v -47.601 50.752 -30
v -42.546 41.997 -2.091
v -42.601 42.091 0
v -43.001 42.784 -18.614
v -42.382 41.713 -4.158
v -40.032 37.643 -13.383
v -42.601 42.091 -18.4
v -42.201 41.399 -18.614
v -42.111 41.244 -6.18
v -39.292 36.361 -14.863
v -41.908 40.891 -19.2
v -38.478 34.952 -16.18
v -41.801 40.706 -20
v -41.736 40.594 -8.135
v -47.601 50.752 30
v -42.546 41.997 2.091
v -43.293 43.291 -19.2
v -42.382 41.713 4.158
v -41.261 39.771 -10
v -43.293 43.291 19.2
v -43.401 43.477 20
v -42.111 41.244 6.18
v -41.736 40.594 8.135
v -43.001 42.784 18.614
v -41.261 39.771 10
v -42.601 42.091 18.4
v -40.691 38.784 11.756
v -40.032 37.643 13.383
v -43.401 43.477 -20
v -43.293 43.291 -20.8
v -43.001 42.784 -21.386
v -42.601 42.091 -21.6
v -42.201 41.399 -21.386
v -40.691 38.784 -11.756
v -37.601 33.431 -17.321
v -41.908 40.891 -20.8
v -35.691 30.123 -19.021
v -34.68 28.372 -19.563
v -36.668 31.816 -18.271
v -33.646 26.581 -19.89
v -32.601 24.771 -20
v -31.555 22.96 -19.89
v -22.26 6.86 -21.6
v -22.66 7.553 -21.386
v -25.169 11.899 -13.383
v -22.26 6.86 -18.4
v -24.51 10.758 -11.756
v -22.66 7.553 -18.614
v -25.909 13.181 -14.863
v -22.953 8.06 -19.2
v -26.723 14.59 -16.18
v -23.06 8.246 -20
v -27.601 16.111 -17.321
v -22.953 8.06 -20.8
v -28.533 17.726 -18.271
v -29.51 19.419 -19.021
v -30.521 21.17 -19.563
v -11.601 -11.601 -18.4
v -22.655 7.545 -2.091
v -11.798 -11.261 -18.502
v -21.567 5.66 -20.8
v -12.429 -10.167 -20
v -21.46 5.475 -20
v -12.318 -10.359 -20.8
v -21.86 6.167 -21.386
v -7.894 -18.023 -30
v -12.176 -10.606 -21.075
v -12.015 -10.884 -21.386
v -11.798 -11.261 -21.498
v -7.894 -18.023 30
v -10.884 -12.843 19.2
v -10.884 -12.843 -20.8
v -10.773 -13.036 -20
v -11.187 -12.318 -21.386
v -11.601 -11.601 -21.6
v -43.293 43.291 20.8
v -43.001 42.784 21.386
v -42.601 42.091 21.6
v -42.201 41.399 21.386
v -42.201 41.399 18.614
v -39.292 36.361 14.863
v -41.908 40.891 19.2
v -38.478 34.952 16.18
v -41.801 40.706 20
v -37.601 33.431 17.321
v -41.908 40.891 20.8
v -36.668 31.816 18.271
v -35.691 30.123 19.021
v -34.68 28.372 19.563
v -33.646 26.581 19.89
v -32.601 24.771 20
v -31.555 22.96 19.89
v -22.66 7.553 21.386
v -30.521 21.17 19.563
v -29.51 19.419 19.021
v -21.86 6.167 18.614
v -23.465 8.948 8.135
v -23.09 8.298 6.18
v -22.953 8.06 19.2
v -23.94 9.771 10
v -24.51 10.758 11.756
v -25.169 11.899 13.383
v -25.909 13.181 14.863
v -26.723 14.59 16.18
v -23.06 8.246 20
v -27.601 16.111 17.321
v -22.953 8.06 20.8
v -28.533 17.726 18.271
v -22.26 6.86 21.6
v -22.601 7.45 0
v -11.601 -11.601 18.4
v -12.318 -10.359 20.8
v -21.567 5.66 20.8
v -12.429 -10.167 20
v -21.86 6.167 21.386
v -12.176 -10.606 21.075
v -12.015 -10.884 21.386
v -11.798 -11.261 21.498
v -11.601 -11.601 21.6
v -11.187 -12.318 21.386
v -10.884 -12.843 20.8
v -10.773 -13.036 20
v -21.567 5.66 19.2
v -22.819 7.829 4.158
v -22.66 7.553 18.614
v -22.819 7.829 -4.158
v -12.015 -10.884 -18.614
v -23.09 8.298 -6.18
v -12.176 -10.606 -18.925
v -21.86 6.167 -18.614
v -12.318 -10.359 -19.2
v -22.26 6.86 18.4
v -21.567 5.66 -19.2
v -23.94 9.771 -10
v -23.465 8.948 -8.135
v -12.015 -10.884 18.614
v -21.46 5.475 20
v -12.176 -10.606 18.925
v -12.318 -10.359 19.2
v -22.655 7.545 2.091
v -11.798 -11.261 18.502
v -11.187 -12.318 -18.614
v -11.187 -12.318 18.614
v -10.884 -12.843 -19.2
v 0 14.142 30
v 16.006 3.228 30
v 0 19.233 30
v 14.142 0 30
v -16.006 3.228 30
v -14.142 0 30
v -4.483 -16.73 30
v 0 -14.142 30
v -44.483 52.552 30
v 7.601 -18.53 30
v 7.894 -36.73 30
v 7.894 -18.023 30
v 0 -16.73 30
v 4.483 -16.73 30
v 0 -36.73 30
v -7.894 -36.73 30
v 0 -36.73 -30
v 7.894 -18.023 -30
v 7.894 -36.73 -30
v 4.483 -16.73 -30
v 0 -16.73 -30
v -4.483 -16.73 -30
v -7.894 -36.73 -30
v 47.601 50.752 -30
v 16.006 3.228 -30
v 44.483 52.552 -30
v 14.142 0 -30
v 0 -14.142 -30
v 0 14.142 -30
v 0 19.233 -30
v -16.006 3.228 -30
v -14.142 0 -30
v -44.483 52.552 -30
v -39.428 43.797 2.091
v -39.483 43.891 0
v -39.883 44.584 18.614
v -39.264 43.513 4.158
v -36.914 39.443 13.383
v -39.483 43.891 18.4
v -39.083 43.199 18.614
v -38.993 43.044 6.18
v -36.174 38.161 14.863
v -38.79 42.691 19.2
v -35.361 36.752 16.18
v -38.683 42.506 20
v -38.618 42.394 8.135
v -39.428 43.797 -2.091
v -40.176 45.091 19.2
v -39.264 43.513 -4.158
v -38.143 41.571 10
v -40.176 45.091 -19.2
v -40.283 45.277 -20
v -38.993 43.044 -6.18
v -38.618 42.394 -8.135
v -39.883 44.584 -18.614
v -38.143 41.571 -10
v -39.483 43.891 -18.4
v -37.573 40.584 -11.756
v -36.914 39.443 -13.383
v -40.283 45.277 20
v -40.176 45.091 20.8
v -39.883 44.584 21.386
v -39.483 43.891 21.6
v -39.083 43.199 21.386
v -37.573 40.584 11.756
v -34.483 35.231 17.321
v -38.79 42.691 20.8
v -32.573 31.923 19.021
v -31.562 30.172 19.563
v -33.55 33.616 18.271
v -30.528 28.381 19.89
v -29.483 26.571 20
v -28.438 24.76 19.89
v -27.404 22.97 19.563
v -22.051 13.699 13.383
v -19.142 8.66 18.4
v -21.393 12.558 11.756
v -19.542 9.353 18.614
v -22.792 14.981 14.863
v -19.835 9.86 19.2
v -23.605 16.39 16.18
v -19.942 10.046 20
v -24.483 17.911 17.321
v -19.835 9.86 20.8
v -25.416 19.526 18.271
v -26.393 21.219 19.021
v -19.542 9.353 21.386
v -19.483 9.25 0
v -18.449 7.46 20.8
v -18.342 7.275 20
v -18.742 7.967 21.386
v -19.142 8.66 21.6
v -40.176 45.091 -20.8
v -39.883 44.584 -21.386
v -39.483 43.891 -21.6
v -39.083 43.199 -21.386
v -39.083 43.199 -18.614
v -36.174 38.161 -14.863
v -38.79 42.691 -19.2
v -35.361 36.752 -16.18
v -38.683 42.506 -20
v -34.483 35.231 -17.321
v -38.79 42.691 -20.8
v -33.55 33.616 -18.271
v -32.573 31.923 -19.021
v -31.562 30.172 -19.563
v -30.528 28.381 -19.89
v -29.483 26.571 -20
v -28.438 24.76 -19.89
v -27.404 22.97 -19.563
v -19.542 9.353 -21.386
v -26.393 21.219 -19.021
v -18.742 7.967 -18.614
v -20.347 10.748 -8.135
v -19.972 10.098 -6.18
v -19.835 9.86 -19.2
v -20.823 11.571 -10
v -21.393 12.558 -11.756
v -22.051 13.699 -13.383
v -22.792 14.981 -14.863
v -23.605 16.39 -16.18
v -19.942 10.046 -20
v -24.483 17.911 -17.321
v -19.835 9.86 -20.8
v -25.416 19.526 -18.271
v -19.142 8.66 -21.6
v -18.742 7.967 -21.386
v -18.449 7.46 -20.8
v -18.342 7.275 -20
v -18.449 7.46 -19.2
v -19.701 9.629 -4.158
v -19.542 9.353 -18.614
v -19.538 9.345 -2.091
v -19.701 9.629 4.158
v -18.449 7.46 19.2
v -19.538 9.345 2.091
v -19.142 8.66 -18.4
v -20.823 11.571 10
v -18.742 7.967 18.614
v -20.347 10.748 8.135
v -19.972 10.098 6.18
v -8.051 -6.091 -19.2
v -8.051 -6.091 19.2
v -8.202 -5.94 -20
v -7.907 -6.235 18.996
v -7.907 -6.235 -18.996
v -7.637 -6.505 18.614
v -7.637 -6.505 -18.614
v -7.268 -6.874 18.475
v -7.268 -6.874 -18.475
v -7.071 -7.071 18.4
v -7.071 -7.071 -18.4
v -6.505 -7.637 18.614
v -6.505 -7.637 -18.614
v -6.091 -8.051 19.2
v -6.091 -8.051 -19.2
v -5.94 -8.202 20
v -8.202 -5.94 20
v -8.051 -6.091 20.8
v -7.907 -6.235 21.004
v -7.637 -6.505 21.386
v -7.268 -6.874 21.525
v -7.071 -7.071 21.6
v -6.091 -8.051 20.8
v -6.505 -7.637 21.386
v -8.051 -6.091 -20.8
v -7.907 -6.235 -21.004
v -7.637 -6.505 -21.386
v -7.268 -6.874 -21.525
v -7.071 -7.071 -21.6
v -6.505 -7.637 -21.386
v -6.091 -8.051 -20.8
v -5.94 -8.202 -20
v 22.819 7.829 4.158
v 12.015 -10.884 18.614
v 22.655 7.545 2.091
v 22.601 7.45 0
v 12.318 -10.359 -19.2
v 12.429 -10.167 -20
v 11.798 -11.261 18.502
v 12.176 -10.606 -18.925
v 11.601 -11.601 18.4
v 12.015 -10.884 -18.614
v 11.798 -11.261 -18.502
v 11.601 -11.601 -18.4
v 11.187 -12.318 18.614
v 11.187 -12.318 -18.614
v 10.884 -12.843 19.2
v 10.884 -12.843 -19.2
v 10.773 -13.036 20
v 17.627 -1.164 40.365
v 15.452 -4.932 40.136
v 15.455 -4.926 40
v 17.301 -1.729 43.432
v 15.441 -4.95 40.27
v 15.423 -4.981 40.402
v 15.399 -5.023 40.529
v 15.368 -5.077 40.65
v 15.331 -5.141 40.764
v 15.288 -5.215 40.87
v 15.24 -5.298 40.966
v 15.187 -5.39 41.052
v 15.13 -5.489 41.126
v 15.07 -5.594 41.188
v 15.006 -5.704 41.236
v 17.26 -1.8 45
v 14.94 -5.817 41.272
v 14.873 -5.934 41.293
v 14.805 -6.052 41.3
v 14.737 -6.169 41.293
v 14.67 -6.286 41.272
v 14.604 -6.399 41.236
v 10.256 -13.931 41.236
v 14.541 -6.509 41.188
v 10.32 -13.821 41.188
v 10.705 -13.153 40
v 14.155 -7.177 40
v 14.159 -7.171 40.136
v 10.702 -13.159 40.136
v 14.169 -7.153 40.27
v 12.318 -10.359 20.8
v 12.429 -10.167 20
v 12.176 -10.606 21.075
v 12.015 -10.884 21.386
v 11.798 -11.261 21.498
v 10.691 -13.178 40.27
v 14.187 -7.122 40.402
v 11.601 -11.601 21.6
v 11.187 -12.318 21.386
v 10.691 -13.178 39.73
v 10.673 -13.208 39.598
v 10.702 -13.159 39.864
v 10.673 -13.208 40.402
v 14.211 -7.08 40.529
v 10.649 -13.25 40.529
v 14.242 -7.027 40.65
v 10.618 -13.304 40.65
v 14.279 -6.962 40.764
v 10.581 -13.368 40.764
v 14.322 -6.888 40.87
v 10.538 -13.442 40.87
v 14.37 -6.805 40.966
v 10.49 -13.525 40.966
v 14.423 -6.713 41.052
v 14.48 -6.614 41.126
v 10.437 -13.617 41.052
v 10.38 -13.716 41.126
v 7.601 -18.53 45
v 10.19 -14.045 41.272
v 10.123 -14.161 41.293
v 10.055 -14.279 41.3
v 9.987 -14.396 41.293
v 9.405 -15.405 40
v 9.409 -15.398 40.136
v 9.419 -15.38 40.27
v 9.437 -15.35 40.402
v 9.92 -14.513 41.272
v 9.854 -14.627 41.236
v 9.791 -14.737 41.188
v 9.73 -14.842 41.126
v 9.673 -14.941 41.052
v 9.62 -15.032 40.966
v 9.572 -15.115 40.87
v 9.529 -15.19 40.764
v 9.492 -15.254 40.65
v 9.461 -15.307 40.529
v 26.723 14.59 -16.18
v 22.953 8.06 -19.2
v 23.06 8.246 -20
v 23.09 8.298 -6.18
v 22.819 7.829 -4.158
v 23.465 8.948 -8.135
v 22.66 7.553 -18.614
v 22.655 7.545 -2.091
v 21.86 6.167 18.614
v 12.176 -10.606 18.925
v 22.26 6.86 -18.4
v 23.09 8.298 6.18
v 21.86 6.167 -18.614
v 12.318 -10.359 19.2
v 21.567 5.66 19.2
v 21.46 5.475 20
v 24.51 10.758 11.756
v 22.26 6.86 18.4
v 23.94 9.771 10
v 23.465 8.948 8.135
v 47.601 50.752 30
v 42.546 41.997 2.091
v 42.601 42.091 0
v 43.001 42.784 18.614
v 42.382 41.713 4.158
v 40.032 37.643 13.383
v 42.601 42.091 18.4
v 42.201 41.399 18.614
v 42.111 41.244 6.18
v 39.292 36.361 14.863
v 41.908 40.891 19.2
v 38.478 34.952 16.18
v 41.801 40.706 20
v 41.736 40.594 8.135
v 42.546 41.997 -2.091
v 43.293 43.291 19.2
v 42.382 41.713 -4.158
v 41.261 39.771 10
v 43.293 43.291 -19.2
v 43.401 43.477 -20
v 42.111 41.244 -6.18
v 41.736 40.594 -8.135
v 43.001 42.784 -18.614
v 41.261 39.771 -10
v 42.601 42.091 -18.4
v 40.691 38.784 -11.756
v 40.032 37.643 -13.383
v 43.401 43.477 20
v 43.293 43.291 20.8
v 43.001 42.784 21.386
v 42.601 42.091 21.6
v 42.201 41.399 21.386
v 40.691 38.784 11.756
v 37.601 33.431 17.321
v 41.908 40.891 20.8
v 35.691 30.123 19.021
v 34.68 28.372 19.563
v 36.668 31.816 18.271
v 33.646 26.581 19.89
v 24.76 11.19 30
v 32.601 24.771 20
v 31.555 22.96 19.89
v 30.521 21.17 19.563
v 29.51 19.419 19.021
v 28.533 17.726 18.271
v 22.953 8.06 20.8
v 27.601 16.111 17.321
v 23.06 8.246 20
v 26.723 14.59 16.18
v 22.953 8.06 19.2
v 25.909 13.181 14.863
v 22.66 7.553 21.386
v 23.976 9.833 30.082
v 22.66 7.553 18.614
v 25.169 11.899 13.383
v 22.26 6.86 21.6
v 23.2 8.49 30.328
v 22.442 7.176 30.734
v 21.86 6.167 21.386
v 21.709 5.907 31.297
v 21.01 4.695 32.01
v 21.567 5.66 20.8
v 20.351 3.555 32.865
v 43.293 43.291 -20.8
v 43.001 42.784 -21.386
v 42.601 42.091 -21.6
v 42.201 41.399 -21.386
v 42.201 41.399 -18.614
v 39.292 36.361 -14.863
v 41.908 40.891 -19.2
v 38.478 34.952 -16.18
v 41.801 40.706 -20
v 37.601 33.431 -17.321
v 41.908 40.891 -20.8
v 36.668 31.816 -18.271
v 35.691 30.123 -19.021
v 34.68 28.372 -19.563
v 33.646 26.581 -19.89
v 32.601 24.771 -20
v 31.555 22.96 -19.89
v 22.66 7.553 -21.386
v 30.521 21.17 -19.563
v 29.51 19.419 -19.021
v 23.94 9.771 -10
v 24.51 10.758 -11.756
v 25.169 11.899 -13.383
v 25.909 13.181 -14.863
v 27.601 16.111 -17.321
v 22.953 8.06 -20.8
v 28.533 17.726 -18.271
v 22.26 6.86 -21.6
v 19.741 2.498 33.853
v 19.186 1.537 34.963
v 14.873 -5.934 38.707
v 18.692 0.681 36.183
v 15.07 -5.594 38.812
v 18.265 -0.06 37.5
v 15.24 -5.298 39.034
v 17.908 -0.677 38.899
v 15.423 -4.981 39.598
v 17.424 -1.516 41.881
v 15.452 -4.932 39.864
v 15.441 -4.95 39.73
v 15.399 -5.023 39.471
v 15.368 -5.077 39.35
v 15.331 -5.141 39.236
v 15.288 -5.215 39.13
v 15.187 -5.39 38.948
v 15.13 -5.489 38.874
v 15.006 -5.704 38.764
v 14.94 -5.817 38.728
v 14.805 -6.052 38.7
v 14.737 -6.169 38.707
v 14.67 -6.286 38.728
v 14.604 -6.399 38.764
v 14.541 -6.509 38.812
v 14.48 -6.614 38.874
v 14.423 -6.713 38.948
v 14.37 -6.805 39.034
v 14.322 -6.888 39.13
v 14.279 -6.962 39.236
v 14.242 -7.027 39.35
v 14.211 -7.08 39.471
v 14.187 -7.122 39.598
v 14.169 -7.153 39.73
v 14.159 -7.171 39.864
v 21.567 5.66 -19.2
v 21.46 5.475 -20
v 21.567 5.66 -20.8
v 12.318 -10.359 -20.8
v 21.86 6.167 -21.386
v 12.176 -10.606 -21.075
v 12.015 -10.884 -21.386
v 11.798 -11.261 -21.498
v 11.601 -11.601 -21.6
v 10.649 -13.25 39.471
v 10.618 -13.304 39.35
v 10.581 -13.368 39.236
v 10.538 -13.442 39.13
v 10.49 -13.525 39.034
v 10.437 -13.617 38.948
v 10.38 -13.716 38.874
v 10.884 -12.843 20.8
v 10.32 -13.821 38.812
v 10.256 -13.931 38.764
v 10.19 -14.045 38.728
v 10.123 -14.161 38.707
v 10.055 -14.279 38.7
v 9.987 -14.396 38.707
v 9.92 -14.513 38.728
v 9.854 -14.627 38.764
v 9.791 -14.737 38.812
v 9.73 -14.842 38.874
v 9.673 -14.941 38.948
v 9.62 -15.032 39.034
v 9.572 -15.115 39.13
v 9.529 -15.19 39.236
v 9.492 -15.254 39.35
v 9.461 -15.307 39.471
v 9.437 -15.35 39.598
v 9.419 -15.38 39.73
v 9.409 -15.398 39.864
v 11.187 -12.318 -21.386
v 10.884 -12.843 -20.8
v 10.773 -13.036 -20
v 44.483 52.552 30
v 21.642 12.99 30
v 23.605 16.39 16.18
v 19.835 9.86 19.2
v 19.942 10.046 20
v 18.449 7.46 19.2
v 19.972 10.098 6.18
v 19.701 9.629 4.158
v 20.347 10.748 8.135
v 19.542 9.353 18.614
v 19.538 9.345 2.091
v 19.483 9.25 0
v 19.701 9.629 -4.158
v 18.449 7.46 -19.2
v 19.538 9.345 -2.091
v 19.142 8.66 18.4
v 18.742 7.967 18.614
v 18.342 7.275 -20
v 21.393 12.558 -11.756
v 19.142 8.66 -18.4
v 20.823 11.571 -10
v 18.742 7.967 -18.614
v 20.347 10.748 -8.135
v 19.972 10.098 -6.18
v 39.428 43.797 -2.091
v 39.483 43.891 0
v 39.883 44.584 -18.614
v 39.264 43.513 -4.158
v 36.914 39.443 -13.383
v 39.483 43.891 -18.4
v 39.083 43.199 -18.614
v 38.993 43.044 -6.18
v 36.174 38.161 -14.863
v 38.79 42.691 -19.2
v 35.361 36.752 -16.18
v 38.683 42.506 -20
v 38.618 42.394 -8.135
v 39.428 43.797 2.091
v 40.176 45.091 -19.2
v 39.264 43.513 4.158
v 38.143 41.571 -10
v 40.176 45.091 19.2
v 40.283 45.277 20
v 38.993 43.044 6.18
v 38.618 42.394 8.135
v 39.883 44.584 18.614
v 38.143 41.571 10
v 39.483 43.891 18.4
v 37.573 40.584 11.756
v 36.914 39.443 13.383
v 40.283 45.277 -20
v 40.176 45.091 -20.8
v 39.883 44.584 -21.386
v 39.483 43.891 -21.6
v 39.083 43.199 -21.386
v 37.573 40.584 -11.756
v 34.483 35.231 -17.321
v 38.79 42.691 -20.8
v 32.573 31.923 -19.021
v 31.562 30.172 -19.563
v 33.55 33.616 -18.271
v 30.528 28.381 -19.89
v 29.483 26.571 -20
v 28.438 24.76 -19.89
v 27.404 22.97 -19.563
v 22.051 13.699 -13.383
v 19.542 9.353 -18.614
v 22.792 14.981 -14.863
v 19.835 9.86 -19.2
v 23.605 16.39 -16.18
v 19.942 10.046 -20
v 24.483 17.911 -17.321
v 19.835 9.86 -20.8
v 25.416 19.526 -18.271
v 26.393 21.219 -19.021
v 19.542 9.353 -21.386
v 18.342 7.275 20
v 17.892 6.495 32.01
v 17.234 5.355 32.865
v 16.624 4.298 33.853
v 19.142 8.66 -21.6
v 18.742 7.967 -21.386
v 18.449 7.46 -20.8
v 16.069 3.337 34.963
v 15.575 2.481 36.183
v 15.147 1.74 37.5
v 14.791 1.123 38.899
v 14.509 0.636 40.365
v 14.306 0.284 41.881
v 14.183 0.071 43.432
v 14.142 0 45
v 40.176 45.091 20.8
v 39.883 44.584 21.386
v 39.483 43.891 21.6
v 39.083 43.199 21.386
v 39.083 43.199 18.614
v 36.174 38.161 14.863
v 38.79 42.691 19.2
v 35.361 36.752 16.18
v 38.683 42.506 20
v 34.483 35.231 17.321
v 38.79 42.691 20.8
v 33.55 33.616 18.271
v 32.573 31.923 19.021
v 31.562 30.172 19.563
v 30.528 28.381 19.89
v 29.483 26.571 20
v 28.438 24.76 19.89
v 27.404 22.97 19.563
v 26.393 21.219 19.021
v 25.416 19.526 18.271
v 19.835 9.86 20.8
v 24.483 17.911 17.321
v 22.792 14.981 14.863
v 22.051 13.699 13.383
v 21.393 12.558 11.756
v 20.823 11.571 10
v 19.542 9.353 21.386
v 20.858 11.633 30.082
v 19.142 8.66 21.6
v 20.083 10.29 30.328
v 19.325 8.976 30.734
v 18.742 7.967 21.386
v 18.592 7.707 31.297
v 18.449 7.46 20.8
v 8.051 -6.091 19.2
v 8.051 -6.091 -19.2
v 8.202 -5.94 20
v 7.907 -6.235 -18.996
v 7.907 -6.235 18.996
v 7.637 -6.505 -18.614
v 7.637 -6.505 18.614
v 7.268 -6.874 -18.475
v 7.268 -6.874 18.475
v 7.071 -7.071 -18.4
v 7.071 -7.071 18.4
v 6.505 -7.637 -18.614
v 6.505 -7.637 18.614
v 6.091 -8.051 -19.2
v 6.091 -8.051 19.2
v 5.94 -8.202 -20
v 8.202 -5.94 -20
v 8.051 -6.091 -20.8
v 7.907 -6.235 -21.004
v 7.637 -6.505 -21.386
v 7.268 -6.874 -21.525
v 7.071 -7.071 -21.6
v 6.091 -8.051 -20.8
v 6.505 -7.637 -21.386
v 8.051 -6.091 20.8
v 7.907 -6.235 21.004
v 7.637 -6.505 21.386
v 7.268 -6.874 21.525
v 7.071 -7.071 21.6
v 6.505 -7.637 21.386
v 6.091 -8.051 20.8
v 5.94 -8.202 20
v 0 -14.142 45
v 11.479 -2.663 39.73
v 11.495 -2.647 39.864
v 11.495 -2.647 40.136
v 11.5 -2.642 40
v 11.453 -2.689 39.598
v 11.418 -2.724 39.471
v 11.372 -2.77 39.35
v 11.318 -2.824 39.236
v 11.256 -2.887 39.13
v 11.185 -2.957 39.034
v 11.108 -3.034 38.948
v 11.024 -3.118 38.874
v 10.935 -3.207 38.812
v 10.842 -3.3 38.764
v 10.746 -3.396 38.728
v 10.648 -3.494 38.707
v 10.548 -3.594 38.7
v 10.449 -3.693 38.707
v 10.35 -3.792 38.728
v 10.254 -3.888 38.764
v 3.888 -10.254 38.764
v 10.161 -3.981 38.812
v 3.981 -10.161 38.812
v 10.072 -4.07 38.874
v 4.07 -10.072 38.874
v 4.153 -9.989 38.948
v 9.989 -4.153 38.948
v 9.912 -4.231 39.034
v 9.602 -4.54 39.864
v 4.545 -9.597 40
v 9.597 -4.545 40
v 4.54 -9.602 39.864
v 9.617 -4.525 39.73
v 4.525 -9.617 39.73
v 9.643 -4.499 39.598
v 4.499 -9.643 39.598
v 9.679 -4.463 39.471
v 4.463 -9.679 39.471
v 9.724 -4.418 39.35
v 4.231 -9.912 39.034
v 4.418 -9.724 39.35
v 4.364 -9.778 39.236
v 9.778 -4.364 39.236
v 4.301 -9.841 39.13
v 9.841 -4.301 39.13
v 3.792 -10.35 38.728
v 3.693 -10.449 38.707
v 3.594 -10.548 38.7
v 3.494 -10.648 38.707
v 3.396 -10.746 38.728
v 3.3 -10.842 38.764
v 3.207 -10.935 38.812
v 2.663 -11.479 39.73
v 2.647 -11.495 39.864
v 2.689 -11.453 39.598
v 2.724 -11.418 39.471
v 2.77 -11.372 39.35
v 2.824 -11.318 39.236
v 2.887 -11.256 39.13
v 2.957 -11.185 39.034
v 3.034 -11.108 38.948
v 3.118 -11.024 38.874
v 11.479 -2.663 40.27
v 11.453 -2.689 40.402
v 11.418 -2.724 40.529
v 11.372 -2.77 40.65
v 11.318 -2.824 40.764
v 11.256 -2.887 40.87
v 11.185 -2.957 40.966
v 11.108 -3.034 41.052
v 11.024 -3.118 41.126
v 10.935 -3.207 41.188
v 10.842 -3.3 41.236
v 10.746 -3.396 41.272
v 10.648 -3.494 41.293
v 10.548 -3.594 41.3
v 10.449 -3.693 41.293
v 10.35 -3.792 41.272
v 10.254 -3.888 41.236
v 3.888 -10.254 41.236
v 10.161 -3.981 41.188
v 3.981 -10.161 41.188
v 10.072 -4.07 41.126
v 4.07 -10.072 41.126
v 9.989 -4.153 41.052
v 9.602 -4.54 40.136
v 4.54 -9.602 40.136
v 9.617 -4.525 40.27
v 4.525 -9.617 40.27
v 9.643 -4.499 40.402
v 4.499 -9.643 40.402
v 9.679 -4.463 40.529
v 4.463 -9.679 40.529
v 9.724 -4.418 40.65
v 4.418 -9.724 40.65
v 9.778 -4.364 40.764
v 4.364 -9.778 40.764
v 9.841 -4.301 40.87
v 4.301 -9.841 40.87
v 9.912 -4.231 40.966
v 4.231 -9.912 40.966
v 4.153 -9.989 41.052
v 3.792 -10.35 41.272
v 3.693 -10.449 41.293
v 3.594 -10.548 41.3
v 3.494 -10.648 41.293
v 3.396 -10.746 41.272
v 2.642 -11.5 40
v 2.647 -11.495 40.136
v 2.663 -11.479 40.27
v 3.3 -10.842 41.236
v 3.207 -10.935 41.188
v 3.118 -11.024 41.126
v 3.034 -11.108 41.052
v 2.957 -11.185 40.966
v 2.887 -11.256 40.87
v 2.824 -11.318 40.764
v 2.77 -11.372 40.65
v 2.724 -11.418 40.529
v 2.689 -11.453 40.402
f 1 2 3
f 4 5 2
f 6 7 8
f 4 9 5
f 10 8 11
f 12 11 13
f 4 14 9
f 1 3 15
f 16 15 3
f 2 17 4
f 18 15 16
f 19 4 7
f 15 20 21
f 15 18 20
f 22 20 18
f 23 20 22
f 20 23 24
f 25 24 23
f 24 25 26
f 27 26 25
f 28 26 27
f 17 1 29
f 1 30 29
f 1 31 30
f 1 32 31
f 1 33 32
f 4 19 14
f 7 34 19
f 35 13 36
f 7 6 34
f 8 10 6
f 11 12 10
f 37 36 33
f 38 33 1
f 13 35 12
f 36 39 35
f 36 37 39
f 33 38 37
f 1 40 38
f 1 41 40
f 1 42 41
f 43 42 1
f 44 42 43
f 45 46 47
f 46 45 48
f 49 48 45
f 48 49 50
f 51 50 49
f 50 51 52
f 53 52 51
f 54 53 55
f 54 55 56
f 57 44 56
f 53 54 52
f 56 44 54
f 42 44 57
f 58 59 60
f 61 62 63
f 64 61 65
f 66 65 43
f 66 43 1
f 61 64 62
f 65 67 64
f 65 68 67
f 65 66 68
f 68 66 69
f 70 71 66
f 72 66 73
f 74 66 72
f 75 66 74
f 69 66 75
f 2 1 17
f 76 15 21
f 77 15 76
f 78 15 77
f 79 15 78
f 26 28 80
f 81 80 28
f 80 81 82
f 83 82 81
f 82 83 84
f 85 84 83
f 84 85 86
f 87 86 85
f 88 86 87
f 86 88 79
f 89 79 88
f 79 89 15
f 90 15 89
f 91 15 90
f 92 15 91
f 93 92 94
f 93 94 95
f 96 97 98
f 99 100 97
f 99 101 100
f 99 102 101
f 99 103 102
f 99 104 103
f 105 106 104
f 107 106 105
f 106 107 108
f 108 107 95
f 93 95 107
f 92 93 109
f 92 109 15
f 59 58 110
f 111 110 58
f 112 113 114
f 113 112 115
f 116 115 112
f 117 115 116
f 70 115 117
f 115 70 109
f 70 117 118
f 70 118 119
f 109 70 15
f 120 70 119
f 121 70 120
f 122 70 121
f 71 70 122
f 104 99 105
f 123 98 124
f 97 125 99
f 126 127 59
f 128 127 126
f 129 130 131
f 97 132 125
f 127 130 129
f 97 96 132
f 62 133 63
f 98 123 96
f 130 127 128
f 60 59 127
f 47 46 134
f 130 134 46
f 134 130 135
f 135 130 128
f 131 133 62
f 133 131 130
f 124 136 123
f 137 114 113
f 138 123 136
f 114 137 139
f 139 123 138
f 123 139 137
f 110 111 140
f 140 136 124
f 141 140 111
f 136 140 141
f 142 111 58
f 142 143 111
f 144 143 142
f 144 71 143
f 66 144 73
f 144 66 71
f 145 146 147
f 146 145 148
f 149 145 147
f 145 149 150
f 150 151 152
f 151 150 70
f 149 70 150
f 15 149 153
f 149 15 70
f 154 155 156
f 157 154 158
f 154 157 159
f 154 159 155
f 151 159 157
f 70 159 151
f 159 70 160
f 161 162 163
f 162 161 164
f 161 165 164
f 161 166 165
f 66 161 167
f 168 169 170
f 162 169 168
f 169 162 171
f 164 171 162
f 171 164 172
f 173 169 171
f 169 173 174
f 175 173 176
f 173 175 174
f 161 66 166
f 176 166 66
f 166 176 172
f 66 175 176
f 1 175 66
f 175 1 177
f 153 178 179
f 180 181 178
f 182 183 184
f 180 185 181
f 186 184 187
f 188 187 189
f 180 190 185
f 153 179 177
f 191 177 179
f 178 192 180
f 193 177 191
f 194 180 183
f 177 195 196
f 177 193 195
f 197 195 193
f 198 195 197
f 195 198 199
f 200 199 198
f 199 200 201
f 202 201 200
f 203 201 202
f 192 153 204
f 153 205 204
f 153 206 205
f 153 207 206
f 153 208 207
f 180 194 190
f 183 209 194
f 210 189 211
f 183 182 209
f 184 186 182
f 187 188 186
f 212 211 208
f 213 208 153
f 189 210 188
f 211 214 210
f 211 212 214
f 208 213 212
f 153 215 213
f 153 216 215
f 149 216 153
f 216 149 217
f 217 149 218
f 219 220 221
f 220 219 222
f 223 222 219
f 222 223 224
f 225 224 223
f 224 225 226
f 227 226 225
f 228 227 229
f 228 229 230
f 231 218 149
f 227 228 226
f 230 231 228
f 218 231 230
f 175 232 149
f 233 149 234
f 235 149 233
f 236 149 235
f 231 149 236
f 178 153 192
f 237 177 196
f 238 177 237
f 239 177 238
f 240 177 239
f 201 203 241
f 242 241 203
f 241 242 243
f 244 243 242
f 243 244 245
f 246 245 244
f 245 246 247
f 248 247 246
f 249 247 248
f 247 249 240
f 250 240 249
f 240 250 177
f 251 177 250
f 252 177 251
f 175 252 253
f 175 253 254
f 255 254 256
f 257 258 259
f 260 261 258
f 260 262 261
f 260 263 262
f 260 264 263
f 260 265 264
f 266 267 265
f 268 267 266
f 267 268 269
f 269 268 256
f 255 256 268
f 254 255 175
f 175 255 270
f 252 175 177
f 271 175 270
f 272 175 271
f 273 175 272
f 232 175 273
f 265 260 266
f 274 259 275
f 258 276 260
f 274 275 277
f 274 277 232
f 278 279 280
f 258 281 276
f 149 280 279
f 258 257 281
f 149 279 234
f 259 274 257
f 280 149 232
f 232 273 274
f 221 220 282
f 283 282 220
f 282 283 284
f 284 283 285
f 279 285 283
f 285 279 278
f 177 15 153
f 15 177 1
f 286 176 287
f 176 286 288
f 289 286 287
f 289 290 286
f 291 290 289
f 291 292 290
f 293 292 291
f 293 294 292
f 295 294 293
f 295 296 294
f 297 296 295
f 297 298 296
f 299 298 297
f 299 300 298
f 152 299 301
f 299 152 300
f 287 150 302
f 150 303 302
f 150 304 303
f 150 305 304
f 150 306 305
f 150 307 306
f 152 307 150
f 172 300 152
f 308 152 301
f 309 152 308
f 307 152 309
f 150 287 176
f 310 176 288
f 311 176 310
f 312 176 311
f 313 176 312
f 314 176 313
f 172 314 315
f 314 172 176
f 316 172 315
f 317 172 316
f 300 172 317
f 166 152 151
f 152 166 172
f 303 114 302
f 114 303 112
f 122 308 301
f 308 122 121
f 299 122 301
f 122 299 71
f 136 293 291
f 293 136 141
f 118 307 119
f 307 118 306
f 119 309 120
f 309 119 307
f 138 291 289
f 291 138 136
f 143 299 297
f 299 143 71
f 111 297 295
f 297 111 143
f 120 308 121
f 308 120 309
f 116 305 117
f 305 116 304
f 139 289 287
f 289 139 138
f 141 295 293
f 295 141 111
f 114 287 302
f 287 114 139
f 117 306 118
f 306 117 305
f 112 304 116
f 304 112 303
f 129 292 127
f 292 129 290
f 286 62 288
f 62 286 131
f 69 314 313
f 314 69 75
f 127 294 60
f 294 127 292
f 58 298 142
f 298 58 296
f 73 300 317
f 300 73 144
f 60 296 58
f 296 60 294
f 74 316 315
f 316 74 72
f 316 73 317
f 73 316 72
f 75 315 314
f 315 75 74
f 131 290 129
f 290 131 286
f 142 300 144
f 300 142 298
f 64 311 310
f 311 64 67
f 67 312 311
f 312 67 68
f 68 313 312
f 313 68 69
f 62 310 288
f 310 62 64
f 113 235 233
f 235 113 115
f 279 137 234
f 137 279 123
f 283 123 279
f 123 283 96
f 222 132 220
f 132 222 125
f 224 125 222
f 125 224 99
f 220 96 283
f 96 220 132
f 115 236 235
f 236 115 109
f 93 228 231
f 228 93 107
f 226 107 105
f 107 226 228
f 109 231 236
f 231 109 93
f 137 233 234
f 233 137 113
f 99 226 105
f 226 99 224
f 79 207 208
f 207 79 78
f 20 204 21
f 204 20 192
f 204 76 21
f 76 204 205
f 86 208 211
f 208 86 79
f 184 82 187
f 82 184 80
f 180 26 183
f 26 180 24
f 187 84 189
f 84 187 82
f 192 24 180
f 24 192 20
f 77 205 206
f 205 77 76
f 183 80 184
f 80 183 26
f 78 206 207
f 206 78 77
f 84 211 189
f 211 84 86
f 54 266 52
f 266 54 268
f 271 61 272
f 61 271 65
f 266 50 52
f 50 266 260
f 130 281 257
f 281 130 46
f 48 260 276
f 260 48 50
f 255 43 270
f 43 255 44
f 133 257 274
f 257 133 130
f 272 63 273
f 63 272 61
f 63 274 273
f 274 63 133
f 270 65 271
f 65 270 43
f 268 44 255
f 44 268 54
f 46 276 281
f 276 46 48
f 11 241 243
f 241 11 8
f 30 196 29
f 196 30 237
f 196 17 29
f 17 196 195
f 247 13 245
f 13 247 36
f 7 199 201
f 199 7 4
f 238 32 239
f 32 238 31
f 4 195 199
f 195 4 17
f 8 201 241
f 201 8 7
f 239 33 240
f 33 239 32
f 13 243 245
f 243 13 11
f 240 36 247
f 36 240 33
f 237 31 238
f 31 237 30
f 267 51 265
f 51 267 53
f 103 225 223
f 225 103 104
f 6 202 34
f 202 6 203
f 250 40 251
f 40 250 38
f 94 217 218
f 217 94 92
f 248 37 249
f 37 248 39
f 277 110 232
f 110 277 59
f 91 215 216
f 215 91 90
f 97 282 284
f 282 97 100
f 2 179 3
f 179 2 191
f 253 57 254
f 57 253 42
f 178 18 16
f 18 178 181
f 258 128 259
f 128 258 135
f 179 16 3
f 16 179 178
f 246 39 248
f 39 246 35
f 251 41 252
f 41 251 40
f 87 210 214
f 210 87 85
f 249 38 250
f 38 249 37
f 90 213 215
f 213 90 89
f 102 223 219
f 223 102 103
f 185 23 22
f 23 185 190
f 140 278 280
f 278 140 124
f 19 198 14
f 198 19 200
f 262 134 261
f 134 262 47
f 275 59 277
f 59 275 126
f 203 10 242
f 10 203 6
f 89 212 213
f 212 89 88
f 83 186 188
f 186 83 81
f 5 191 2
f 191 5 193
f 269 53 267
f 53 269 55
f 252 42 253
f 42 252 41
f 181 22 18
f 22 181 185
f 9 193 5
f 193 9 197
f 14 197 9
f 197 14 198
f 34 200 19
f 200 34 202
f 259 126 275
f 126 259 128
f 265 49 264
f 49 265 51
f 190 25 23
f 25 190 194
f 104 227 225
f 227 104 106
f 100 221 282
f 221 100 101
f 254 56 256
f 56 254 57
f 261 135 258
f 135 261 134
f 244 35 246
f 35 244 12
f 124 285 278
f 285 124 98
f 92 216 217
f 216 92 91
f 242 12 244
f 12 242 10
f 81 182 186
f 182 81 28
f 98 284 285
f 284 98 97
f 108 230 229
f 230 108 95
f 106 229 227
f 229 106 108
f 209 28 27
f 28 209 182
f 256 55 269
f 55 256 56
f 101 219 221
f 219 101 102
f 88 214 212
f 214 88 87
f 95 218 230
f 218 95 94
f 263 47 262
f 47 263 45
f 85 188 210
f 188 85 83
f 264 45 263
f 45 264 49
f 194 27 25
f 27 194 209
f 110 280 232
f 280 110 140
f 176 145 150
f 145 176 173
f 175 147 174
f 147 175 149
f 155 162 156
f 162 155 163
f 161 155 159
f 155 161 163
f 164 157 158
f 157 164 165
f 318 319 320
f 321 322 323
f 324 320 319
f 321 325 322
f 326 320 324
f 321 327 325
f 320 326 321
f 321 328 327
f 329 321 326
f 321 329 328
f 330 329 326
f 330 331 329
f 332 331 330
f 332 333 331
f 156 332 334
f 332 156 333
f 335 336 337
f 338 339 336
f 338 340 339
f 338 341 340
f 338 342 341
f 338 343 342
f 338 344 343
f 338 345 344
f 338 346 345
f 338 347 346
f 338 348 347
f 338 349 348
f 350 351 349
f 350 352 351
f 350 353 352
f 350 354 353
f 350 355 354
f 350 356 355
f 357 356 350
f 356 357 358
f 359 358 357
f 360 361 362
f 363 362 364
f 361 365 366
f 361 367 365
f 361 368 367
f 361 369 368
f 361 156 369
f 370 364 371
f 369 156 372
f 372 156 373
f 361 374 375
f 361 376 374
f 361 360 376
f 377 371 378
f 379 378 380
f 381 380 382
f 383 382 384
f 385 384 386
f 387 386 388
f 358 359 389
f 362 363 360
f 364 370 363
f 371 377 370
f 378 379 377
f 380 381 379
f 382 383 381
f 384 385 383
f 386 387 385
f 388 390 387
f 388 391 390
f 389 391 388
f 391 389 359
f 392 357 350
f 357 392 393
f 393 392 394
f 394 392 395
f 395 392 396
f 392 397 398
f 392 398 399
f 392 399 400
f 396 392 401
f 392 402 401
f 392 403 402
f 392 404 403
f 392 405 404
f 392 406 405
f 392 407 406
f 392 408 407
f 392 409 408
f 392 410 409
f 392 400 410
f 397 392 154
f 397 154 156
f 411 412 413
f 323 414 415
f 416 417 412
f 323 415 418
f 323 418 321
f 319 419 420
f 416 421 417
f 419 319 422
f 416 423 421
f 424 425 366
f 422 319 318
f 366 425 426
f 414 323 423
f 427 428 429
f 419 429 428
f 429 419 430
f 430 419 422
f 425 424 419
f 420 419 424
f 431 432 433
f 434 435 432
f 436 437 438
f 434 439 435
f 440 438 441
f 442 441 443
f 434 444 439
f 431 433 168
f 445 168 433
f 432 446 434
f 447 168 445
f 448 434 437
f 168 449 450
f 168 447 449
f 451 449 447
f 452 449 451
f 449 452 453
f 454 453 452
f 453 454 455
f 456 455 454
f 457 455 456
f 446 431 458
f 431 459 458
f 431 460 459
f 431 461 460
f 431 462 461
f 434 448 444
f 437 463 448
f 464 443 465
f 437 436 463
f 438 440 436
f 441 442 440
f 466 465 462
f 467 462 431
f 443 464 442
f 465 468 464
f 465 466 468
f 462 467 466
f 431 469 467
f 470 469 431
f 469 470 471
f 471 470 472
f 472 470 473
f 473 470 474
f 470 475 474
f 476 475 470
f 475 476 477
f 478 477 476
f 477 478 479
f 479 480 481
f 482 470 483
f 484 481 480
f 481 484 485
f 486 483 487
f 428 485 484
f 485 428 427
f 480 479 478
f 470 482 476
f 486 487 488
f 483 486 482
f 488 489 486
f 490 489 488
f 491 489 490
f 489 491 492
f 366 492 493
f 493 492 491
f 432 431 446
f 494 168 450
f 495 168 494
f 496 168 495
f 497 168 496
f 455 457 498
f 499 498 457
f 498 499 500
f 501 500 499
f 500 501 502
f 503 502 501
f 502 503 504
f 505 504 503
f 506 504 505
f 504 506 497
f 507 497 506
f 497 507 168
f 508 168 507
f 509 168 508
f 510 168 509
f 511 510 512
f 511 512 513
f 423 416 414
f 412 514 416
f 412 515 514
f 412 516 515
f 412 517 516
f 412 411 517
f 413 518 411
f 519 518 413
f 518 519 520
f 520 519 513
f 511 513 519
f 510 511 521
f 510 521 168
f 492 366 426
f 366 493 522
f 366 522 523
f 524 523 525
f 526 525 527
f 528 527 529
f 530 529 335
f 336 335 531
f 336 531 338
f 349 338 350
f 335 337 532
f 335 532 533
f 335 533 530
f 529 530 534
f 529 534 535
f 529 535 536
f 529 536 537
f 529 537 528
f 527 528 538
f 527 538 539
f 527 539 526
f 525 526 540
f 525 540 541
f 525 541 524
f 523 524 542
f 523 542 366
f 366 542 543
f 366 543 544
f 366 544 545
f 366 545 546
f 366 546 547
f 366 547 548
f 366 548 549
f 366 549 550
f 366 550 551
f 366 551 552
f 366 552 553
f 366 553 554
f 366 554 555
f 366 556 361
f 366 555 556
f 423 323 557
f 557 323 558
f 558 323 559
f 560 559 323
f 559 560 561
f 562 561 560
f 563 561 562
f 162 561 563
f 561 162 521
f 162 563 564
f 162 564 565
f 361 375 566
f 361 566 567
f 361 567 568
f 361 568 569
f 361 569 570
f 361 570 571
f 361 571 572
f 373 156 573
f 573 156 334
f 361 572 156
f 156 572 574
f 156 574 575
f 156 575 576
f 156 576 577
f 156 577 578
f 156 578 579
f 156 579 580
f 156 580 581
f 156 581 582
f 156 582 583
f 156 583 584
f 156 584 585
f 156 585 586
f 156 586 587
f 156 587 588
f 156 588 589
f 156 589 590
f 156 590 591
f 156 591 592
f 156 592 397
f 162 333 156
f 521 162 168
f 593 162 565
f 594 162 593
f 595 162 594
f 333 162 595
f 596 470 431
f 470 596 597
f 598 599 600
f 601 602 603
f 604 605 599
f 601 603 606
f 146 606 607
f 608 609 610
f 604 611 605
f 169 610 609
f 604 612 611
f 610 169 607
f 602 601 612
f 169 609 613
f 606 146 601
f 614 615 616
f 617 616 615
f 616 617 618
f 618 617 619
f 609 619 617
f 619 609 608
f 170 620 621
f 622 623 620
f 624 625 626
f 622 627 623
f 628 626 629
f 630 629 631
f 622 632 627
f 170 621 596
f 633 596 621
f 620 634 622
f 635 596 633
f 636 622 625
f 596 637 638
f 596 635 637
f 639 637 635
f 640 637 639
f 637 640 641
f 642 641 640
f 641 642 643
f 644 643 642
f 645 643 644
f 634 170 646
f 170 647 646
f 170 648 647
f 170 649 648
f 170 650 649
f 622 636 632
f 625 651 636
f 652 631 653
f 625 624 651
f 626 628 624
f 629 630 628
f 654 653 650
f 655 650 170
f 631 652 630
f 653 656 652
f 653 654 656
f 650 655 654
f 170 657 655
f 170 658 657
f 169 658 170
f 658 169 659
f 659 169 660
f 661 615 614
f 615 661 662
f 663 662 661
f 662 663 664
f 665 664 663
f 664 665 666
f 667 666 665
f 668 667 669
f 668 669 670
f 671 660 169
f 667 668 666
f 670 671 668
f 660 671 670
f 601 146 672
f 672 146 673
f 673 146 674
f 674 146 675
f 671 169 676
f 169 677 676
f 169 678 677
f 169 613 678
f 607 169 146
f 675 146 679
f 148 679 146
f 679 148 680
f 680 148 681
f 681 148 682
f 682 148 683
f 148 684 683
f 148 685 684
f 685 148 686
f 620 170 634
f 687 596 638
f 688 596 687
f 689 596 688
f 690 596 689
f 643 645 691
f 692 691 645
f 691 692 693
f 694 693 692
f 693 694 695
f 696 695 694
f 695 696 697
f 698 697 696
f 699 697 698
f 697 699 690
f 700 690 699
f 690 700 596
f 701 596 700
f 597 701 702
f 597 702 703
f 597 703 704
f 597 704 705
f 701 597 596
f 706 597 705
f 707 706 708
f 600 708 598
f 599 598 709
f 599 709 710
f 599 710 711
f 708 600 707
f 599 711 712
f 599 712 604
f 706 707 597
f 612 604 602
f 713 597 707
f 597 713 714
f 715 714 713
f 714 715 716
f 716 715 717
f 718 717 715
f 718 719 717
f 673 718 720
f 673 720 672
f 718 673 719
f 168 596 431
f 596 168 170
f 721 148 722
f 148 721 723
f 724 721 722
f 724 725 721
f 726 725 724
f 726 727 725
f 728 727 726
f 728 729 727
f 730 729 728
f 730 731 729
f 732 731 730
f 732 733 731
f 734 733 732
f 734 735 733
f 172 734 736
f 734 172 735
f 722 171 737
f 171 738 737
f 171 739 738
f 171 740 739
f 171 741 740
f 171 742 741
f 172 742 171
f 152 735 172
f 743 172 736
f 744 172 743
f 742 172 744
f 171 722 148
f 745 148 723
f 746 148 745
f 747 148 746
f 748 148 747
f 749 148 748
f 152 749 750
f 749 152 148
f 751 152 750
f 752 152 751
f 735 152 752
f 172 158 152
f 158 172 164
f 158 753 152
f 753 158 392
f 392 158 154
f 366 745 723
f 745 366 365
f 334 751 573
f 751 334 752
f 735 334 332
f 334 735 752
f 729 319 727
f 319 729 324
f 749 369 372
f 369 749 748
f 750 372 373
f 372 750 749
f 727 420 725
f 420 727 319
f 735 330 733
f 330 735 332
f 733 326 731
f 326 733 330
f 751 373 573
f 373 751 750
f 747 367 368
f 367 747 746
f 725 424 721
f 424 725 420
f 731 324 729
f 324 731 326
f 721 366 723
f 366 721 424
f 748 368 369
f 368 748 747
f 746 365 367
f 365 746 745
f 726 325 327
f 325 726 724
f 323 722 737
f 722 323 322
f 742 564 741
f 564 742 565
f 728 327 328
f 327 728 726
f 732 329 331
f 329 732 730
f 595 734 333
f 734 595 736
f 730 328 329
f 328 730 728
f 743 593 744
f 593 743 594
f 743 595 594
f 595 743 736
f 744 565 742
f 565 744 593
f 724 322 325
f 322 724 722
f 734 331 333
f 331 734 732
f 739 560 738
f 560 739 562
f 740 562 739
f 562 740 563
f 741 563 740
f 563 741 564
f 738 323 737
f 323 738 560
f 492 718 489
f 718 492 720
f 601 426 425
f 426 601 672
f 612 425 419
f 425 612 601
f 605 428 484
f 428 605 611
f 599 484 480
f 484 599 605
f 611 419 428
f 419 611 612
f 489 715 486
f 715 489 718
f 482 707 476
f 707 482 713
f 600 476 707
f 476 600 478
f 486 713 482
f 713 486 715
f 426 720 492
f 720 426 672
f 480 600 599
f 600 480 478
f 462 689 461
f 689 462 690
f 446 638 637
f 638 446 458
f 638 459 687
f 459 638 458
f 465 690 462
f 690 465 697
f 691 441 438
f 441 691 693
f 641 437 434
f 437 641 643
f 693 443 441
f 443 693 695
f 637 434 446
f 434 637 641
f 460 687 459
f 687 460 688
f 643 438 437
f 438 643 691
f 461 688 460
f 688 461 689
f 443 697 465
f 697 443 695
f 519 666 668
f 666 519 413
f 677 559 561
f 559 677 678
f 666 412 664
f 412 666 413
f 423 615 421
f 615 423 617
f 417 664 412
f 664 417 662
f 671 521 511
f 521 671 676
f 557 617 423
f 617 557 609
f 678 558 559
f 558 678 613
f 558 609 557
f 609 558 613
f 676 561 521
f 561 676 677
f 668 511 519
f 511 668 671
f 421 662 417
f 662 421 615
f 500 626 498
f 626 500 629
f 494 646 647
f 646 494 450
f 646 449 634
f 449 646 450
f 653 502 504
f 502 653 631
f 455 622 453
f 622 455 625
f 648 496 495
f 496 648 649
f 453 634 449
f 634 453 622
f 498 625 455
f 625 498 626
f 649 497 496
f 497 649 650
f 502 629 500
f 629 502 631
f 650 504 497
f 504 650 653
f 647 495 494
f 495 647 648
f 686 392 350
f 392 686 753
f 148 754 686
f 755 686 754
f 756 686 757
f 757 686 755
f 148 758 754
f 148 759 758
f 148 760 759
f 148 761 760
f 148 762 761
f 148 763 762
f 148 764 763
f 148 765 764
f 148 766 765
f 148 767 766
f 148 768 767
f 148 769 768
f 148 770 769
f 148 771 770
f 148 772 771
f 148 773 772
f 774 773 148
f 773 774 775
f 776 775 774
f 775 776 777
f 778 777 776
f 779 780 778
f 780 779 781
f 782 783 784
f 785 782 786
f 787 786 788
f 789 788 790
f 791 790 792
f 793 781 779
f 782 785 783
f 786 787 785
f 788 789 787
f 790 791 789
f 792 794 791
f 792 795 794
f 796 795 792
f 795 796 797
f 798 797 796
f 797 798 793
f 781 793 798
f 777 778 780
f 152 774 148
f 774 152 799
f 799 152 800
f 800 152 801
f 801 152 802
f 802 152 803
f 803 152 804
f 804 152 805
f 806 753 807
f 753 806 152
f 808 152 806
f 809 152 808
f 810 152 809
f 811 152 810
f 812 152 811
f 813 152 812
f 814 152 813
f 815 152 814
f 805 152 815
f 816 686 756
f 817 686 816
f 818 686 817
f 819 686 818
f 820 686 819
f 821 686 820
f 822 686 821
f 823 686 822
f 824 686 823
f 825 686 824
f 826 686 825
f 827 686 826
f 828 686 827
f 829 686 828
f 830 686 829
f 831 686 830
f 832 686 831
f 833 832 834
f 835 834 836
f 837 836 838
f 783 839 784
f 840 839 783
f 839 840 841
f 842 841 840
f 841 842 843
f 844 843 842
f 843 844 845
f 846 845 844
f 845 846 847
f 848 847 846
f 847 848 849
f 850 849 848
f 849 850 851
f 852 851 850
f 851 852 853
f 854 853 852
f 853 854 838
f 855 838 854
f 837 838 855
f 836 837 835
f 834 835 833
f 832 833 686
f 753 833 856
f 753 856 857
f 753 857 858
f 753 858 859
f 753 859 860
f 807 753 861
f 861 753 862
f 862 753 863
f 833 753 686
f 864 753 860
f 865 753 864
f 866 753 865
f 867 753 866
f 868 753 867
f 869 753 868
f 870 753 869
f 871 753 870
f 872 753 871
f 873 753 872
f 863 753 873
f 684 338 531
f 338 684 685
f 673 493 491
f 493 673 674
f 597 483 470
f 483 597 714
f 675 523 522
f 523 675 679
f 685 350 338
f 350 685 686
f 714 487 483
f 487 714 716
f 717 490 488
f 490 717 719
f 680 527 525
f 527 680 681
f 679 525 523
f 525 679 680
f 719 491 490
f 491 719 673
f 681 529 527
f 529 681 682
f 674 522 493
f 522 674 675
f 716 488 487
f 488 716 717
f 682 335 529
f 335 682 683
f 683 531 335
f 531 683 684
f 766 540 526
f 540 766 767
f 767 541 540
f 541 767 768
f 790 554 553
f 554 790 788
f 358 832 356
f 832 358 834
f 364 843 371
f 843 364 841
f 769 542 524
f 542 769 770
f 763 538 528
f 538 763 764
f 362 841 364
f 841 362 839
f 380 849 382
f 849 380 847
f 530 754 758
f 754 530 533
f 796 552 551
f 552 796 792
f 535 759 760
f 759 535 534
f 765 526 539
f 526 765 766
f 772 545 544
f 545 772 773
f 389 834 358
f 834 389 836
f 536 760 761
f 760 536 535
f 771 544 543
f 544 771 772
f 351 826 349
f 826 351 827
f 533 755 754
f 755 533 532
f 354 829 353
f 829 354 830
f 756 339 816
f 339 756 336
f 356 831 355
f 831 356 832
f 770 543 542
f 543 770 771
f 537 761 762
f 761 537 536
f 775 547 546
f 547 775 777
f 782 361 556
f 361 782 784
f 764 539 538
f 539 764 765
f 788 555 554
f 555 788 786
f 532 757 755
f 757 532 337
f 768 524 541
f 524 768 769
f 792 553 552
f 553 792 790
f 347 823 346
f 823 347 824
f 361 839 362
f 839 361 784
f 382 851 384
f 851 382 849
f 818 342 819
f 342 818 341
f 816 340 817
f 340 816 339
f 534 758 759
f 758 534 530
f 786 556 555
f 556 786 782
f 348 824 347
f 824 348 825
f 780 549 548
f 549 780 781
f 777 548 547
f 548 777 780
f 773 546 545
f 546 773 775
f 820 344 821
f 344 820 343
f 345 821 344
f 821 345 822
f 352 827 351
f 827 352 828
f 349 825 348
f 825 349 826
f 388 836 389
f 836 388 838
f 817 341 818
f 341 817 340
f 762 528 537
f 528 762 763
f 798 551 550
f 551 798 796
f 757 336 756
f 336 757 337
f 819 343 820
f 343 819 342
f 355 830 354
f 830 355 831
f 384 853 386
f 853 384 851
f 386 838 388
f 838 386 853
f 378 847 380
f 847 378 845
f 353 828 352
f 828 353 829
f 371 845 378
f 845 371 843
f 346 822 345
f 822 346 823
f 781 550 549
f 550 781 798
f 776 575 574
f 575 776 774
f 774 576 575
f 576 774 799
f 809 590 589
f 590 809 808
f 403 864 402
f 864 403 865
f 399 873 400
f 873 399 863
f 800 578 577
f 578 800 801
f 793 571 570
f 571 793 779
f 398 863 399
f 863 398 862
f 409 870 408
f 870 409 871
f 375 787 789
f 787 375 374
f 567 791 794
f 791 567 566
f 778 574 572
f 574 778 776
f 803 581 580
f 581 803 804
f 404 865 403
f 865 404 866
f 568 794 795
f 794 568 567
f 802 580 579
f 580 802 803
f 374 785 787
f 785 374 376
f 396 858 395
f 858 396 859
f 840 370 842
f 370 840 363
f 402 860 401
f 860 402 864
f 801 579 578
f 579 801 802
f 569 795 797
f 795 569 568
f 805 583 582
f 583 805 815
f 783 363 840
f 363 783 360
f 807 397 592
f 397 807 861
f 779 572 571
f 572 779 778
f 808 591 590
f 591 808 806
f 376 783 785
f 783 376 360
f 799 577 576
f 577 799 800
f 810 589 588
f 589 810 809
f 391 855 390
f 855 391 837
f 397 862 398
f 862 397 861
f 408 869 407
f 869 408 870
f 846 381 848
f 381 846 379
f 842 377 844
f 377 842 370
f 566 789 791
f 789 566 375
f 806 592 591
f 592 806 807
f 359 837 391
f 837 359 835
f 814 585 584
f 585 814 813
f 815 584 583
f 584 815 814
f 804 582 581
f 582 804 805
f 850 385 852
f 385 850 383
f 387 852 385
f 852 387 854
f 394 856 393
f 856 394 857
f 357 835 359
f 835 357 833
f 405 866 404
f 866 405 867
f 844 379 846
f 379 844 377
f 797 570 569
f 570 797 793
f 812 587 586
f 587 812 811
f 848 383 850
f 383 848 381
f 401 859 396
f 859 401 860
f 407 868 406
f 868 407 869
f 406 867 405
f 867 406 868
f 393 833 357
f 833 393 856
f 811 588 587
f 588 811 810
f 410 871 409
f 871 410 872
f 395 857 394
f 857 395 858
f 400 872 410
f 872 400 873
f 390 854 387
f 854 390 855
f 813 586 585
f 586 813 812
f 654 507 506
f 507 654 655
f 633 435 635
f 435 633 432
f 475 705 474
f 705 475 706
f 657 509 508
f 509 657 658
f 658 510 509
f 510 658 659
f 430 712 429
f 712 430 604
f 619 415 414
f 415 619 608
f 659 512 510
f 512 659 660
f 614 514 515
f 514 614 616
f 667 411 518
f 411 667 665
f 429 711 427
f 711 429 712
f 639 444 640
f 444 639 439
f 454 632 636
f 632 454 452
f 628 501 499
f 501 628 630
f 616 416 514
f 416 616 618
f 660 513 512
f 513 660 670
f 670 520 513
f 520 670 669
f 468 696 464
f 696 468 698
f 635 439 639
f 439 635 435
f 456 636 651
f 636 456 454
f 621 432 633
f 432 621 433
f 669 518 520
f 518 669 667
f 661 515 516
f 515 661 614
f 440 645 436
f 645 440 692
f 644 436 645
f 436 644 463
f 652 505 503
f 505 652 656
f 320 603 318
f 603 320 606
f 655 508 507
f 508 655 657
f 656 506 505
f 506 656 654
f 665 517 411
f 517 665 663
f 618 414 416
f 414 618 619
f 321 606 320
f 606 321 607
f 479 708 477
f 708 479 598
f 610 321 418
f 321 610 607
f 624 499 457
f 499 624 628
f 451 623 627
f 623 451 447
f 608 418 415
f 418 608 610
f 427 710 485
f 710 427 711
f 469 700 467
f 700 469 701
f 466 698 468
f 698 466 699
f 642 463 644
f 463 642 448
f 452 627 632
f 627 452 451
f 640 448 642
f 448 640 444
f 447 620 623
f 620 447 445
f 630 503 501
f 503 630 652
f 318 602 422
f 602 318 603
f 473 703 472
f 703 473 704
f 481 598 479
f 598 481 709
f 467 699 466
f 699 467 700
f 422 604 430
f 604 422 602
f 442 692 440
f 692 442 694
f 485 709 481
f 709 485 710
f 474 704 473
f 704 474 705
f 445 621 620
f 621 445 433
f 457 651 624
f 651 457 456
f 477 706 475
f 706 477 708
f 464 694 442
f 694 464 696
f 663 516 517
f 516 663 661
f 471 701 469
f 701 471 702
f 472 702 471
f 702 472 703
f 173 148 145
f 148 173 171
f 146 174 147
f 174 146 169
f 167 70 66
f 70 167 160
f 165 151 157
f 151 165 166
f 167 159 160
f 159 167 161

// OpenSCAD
// file: libraries/frame_axis_block.scad
// extr=20; h = 3*extr; w = h; diagonal = extr*sqrt(2); thickness=3.6; 
 

module frame_axis_block(h, w, thickness, extr, diagonal) {
  difference() {
    intersection() {
      //rotate([0, 0, -30])
       translate([-extr*sin(15), -extr*cos(15), -h/2], center=false)
	        cube([extr*sin(15)+thickness, w, h]);
      union() {
	      translate([0,-extr*cos(15), -h/2]) 
      //   rotate([0, 0, -30])
	          cube([thickness, w, h]); //main frame plate
	    //  rotate([0, 0, -45])
        translate([-extr*sin(15), -extr*cos(15), -h/2])
          rotate([0,0,-15])
	          cube([extr, extr, h], center=false); //15degr extr cutout
      }
    } 
    
    
      // Vertical OpenBeam mounting screw holes.
       # for (z=[h/2-extr/2, -h/2+extr/2]) {
          translate([0, 0, z]) 
            rotate([90, 0, 75])
              translate([-extr/2, 0, extr/2*sin(15)+5]) {
                 cylinder(r=1.6, h=50, $fn=12, center=true);
                // cylinder(r=2.8, h=3, $fn=12, center=true);
        }
      }
    // Horizontal OpenBeam mounting screw holes.
       for (z= [h/2-extr/2, -h/2+extr/2]){
       for (y = [extr/2, w-extr*cos(15)-extr/2]) {
           translate([0, y, z])
             rotate([0, 90, 0])
               cylinder(r=1.6, h=10, $fn=12, center=true);
       }
      }  
    
}
}
//
// scale([1, 1, 1]) rotate([0, 90, 90]) rotate([0, 0, 30]) 
//{ frame_axis_block(h, w, thickness, extr, diagonal);
//    translate([-extr*sin(15), -extr*cos(15), -h]) rotate([0, 0, 75]) % cube([extr, extr, 1000], center=false);
//   }
// file: configuration.scad
// OD = outside diameter, corner to corner.
m3_nut_od = 6.1;
m3_nut_radius = (m3_nut_od+0.2)/2;

// Major diameter of metric 3mm thread.
m3_major = 2.85;
m3_radius = m3_major/2;
m3_open_radius = 3.2/2;
m3_cap=4;
m3_clr=0.2;

// NEMA17 stepper motors.
motor_d=48;
motor_shaft_diameter = 5;
motor_shaft_radius = (motor_shaft_diameter+0.3)/2;

//frame motor dimm
motor_screws = 31; // mm center-to-center
motor_width = 42.5; // mm total motor face width
motor_height = 15; // mm bracket height
motor_length = 12; // mm bracket length
motor_screws_height = (motor_width - motor_screws) / 2;
motor_shaft = 30; // mm from motor face to OpenBeam center
motor_thickness = 5; // mm bracket thickness
//height = 2*extr + motor_width;
//diagonal = extr*sqrt(2);
motor_offset = motor_shaft+2;

// Frame brackets.
thickness = 3.6;

// extrusion dimmensions
extr = 20; //15 - 20 for 20x20 extrusion
extr_tslot = 6.8; //3.2 6.8 for 20x20 extrusion
extr_nut = 11; //5.8 11 for 20x20 extrusion
extr_corn = (extr - extr_tslot)/2;
diagonal=extr*sqrt(2);

clear = 0.4;

// motor offset change 24mm - pulley size +2mm offset
//if (motor_shaft < 24) {
  //motor_offset = 24 ;
  //}
  //else  {motor_offset = 24;
  //}

//dimmensions calculations for frame_motor (some trigonometry)

f1= (extr*sin(15)+thickness)/cos(30);
f2=(extr*sin(15)+thickness)*cos(60)/sin(60);
L=f1+diagonal+motor_offset;
f4=L*sin(30)/cos(30)-motor_d/2;
f3=f4/2;
w_fm = L/cos(30)-f3-f2;

//motor cut_off frame
h_mot_cut_off = L*sin(30) - (motor_screws - motor_d/2)*cos(30);
// main file
include <configuration.scad>;
use <libraries/frame_axis_block.scad>;


//extr=15;
h = 3*extr;
w = 4*extr;
diagonal = extr*sqrt(2);
estp_sw=1; //put 1 to enable enstop holes
double_frame=1; //put 1 to enable dual_frame option
estp_out = 15; //distance between lower frame and endstop hole(works only if dual_frame on)

frame_cheek_output=1;
//frame cheek output:
//1 - for sqear tube version
//2 - for separate right cheek
//3 - for separate left cheek
//4 - assembled version.


module frame_cheek(double_frame,estp_sw)
{
  difference ()  {
   //rotate ([0,0,-30])
    union () {
      frame_axis_block(h, w, thickness, extr, diagonal);
      if (double_frame==1) { //small addon to parts width in oder to fit endstop under lower frame if "dual frame" is on
       if (estp_sw==1) {
         intersection() {
              translate([-extr*sin(15), -extr*cos(15), h/2], center=false)
                cube([extr*sin(15)+thickness, extr*cos(15)+estp_out, estp_out]);
            difference() {
              union (){
                translate([-extr*sin(15), -extr*cos(15), h/2])
                   rotate([0,0,-15])
                   cube([extr, extr*cos(15)+20 , estp_out], center=false); //15degr extr cutout
                translate([0, -extr*cos(15), h/2], center=false)
                   cube([thickness, extr*cos(15)+estp_out , estp_out]);
              }
              translate([-thickness/2, estp_out, h/2+estp_out]) rotate([0, 90, 0]) 
                cylinder(r=estp_out, h=thickness*2, center=false, $fn=60);
            }
       }

      }
    }
    }
    if (double_frame==1) { 
      if ( estp_sw == 1) {
        //// HoneyWell ZM micro switch holes
        translate([-5, -extr*cos(15)/2+9.5/2, h/2-extr/4+estp_out]) rotate([0, 90, 0]) 
          cylinder(r=1.3, h=50, center=false, $fn=60);
        translate([-5, -extr*cos(15)/2-9.5/2, h/2-extr/4+estp_out]) rotate([0, 90, 0]) 
          cylinder(r=1.3, h=50, center=false, $fn=60);}
      }
      else {if (estp_sw==1) {
      //// HoneyWell ZM micro switch.
        translate([-5, -extr*cos(15)/2+9.5/2, h/2-extr/4]) rotate([0, 90, 0]) 
          cylinder(r=1.3, h=50, center=false, $fn=60);
        translate([-5, -extr*cos(15)/2-9.5/2, h/2-extr/4]) rotate([0, 90, 0]) 
          cylinder(r=1.3, h=50, center=false, $fn=60);}  
        }
  

       //hole cuttoff
    rotate([0, 90, 0]) 
    if (double_frame==1) {
      if (h > w) {
        translate([0, w-extr*cos(15), -thickness])
          cylinder(r=(h-extr*2)/2, h=extr, center=true, $fn=60);}
      else {
        translate([0, (w/2-extr*cos(15)+extr/2), -thickness])
          cylinder(r=(w-extr*2)/2, h=extr, center=true, $fn=60);}
    }
    else {
      if (h > w)  {
          translate([h/2-w, w-extr*cos(15), -thickness])
            cylinder(r=w-extr, h=extr, center=true, $fn=60);
          translate([h/2-w, w, -extr/2]) rotate (180,0,0)
            cube([h,w,extr]);
          }
        else {
           translate([-h/2, h-extr*cos(15), -thickness])
             cylinder(r=h-extr, h=extr, center=true, $fn=60);
           translate([-h/2, h-extr , -thickness])  rotate (0,0,0)
             cube([h-extr*cos(15),w,extr]);
        }
    }
 }
}
module frame_cheek_tube () {
  union () {
    for (i=[-1,1]) {
     translate ([diagonal/2*i,0,0]) 
       rotate ([0,0,-30*i]) 
         scale ([i,1,1])
           union (){
             translate ([0,0,-h/2])
               rotate ([00,0,165])
                 translate([0,-thickness,0])
                 cube ([extr+thickness,thickness,h]);
             frame_cheek(double_frame,i);

             translate([0,(-extr*cos(15)),-h/2])
               rotate([0,0,-150]) translate ([thickness,0,0])
               cube([(extr*sin(15)+thickness),20,h]);
           }
    }

  } 
}


//insert module frame_cheek
if (frame_cheek_output==2) {
     scale(1,1,1)
    frame_cheek();
   }  
if (frame_cheek_output==3) {
  //estp_sw=1;
  rotate ([0,0,180])
    scale(-1,1,1) 
      frame_cheek();    
   } 
if (frame_cheek_output==1){
  frame_cheek_tube();
}
//translate([-extr*sin(15),-extr*cos(15), -150])
    // extrusion.
  //% rotate([0, 0, 75]) cube([extr, extr, 300], center=false);
